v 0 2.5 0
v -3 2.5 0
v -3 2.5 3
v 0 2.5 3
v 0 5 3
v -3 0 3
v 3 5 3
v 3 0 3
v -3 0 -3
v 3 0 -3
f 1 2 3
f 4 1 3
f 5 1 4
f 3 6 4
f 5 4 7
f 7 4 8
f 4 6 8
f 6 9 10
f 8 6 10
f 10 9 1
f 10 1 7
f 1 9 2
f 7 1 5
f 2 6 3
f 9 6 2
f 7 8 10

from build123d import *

# Parameters (mm, degrees)
SKETCH1_W           = 6
SKETCH1_H           = 6
BOSS_EXTRUDE1_DEPTH = 5
CUT_EXTRUDE9_DEPTH  = 23.5
CUT_EXTRUDE10_DEPTH = 3


with BuildPart() as part:
    # Sketch1 → Boss-Extrude1 (new body)
    with BuildSketch(Plane(origin=(0, 0, 0), x_dir=(1, 0, 0), z_dir=(0, 1, 0))):
        Rectangle(SKETCH1_W, SKETCH1_H)
    extrude(amount=BOSS_EXTRUDE1_DEPTH)

    # Sketch12 → Cut-Extrude9 (cut)
    with BuildSketch(Plane.ZY.offset(3)):
        Polygon((-3, 0), (3, 5), (-3, 5), align=None)
    extrude(amount=-CUT_EXTRUDE9_DEPTH, mode=Mode.SUBTRACT)

    # Sketch13 → Cut-Extrude10 (cut)
    with BuildSketch(Plane.ZY.offset(3)):
        Polygon((3, 5), (0, 2.5), (3, 2.5), align=None)
    extrude(amount=-CUT_EXTRUDE10_DEPTH, mode=Mode.SUBTRACT)


solid = part.part
